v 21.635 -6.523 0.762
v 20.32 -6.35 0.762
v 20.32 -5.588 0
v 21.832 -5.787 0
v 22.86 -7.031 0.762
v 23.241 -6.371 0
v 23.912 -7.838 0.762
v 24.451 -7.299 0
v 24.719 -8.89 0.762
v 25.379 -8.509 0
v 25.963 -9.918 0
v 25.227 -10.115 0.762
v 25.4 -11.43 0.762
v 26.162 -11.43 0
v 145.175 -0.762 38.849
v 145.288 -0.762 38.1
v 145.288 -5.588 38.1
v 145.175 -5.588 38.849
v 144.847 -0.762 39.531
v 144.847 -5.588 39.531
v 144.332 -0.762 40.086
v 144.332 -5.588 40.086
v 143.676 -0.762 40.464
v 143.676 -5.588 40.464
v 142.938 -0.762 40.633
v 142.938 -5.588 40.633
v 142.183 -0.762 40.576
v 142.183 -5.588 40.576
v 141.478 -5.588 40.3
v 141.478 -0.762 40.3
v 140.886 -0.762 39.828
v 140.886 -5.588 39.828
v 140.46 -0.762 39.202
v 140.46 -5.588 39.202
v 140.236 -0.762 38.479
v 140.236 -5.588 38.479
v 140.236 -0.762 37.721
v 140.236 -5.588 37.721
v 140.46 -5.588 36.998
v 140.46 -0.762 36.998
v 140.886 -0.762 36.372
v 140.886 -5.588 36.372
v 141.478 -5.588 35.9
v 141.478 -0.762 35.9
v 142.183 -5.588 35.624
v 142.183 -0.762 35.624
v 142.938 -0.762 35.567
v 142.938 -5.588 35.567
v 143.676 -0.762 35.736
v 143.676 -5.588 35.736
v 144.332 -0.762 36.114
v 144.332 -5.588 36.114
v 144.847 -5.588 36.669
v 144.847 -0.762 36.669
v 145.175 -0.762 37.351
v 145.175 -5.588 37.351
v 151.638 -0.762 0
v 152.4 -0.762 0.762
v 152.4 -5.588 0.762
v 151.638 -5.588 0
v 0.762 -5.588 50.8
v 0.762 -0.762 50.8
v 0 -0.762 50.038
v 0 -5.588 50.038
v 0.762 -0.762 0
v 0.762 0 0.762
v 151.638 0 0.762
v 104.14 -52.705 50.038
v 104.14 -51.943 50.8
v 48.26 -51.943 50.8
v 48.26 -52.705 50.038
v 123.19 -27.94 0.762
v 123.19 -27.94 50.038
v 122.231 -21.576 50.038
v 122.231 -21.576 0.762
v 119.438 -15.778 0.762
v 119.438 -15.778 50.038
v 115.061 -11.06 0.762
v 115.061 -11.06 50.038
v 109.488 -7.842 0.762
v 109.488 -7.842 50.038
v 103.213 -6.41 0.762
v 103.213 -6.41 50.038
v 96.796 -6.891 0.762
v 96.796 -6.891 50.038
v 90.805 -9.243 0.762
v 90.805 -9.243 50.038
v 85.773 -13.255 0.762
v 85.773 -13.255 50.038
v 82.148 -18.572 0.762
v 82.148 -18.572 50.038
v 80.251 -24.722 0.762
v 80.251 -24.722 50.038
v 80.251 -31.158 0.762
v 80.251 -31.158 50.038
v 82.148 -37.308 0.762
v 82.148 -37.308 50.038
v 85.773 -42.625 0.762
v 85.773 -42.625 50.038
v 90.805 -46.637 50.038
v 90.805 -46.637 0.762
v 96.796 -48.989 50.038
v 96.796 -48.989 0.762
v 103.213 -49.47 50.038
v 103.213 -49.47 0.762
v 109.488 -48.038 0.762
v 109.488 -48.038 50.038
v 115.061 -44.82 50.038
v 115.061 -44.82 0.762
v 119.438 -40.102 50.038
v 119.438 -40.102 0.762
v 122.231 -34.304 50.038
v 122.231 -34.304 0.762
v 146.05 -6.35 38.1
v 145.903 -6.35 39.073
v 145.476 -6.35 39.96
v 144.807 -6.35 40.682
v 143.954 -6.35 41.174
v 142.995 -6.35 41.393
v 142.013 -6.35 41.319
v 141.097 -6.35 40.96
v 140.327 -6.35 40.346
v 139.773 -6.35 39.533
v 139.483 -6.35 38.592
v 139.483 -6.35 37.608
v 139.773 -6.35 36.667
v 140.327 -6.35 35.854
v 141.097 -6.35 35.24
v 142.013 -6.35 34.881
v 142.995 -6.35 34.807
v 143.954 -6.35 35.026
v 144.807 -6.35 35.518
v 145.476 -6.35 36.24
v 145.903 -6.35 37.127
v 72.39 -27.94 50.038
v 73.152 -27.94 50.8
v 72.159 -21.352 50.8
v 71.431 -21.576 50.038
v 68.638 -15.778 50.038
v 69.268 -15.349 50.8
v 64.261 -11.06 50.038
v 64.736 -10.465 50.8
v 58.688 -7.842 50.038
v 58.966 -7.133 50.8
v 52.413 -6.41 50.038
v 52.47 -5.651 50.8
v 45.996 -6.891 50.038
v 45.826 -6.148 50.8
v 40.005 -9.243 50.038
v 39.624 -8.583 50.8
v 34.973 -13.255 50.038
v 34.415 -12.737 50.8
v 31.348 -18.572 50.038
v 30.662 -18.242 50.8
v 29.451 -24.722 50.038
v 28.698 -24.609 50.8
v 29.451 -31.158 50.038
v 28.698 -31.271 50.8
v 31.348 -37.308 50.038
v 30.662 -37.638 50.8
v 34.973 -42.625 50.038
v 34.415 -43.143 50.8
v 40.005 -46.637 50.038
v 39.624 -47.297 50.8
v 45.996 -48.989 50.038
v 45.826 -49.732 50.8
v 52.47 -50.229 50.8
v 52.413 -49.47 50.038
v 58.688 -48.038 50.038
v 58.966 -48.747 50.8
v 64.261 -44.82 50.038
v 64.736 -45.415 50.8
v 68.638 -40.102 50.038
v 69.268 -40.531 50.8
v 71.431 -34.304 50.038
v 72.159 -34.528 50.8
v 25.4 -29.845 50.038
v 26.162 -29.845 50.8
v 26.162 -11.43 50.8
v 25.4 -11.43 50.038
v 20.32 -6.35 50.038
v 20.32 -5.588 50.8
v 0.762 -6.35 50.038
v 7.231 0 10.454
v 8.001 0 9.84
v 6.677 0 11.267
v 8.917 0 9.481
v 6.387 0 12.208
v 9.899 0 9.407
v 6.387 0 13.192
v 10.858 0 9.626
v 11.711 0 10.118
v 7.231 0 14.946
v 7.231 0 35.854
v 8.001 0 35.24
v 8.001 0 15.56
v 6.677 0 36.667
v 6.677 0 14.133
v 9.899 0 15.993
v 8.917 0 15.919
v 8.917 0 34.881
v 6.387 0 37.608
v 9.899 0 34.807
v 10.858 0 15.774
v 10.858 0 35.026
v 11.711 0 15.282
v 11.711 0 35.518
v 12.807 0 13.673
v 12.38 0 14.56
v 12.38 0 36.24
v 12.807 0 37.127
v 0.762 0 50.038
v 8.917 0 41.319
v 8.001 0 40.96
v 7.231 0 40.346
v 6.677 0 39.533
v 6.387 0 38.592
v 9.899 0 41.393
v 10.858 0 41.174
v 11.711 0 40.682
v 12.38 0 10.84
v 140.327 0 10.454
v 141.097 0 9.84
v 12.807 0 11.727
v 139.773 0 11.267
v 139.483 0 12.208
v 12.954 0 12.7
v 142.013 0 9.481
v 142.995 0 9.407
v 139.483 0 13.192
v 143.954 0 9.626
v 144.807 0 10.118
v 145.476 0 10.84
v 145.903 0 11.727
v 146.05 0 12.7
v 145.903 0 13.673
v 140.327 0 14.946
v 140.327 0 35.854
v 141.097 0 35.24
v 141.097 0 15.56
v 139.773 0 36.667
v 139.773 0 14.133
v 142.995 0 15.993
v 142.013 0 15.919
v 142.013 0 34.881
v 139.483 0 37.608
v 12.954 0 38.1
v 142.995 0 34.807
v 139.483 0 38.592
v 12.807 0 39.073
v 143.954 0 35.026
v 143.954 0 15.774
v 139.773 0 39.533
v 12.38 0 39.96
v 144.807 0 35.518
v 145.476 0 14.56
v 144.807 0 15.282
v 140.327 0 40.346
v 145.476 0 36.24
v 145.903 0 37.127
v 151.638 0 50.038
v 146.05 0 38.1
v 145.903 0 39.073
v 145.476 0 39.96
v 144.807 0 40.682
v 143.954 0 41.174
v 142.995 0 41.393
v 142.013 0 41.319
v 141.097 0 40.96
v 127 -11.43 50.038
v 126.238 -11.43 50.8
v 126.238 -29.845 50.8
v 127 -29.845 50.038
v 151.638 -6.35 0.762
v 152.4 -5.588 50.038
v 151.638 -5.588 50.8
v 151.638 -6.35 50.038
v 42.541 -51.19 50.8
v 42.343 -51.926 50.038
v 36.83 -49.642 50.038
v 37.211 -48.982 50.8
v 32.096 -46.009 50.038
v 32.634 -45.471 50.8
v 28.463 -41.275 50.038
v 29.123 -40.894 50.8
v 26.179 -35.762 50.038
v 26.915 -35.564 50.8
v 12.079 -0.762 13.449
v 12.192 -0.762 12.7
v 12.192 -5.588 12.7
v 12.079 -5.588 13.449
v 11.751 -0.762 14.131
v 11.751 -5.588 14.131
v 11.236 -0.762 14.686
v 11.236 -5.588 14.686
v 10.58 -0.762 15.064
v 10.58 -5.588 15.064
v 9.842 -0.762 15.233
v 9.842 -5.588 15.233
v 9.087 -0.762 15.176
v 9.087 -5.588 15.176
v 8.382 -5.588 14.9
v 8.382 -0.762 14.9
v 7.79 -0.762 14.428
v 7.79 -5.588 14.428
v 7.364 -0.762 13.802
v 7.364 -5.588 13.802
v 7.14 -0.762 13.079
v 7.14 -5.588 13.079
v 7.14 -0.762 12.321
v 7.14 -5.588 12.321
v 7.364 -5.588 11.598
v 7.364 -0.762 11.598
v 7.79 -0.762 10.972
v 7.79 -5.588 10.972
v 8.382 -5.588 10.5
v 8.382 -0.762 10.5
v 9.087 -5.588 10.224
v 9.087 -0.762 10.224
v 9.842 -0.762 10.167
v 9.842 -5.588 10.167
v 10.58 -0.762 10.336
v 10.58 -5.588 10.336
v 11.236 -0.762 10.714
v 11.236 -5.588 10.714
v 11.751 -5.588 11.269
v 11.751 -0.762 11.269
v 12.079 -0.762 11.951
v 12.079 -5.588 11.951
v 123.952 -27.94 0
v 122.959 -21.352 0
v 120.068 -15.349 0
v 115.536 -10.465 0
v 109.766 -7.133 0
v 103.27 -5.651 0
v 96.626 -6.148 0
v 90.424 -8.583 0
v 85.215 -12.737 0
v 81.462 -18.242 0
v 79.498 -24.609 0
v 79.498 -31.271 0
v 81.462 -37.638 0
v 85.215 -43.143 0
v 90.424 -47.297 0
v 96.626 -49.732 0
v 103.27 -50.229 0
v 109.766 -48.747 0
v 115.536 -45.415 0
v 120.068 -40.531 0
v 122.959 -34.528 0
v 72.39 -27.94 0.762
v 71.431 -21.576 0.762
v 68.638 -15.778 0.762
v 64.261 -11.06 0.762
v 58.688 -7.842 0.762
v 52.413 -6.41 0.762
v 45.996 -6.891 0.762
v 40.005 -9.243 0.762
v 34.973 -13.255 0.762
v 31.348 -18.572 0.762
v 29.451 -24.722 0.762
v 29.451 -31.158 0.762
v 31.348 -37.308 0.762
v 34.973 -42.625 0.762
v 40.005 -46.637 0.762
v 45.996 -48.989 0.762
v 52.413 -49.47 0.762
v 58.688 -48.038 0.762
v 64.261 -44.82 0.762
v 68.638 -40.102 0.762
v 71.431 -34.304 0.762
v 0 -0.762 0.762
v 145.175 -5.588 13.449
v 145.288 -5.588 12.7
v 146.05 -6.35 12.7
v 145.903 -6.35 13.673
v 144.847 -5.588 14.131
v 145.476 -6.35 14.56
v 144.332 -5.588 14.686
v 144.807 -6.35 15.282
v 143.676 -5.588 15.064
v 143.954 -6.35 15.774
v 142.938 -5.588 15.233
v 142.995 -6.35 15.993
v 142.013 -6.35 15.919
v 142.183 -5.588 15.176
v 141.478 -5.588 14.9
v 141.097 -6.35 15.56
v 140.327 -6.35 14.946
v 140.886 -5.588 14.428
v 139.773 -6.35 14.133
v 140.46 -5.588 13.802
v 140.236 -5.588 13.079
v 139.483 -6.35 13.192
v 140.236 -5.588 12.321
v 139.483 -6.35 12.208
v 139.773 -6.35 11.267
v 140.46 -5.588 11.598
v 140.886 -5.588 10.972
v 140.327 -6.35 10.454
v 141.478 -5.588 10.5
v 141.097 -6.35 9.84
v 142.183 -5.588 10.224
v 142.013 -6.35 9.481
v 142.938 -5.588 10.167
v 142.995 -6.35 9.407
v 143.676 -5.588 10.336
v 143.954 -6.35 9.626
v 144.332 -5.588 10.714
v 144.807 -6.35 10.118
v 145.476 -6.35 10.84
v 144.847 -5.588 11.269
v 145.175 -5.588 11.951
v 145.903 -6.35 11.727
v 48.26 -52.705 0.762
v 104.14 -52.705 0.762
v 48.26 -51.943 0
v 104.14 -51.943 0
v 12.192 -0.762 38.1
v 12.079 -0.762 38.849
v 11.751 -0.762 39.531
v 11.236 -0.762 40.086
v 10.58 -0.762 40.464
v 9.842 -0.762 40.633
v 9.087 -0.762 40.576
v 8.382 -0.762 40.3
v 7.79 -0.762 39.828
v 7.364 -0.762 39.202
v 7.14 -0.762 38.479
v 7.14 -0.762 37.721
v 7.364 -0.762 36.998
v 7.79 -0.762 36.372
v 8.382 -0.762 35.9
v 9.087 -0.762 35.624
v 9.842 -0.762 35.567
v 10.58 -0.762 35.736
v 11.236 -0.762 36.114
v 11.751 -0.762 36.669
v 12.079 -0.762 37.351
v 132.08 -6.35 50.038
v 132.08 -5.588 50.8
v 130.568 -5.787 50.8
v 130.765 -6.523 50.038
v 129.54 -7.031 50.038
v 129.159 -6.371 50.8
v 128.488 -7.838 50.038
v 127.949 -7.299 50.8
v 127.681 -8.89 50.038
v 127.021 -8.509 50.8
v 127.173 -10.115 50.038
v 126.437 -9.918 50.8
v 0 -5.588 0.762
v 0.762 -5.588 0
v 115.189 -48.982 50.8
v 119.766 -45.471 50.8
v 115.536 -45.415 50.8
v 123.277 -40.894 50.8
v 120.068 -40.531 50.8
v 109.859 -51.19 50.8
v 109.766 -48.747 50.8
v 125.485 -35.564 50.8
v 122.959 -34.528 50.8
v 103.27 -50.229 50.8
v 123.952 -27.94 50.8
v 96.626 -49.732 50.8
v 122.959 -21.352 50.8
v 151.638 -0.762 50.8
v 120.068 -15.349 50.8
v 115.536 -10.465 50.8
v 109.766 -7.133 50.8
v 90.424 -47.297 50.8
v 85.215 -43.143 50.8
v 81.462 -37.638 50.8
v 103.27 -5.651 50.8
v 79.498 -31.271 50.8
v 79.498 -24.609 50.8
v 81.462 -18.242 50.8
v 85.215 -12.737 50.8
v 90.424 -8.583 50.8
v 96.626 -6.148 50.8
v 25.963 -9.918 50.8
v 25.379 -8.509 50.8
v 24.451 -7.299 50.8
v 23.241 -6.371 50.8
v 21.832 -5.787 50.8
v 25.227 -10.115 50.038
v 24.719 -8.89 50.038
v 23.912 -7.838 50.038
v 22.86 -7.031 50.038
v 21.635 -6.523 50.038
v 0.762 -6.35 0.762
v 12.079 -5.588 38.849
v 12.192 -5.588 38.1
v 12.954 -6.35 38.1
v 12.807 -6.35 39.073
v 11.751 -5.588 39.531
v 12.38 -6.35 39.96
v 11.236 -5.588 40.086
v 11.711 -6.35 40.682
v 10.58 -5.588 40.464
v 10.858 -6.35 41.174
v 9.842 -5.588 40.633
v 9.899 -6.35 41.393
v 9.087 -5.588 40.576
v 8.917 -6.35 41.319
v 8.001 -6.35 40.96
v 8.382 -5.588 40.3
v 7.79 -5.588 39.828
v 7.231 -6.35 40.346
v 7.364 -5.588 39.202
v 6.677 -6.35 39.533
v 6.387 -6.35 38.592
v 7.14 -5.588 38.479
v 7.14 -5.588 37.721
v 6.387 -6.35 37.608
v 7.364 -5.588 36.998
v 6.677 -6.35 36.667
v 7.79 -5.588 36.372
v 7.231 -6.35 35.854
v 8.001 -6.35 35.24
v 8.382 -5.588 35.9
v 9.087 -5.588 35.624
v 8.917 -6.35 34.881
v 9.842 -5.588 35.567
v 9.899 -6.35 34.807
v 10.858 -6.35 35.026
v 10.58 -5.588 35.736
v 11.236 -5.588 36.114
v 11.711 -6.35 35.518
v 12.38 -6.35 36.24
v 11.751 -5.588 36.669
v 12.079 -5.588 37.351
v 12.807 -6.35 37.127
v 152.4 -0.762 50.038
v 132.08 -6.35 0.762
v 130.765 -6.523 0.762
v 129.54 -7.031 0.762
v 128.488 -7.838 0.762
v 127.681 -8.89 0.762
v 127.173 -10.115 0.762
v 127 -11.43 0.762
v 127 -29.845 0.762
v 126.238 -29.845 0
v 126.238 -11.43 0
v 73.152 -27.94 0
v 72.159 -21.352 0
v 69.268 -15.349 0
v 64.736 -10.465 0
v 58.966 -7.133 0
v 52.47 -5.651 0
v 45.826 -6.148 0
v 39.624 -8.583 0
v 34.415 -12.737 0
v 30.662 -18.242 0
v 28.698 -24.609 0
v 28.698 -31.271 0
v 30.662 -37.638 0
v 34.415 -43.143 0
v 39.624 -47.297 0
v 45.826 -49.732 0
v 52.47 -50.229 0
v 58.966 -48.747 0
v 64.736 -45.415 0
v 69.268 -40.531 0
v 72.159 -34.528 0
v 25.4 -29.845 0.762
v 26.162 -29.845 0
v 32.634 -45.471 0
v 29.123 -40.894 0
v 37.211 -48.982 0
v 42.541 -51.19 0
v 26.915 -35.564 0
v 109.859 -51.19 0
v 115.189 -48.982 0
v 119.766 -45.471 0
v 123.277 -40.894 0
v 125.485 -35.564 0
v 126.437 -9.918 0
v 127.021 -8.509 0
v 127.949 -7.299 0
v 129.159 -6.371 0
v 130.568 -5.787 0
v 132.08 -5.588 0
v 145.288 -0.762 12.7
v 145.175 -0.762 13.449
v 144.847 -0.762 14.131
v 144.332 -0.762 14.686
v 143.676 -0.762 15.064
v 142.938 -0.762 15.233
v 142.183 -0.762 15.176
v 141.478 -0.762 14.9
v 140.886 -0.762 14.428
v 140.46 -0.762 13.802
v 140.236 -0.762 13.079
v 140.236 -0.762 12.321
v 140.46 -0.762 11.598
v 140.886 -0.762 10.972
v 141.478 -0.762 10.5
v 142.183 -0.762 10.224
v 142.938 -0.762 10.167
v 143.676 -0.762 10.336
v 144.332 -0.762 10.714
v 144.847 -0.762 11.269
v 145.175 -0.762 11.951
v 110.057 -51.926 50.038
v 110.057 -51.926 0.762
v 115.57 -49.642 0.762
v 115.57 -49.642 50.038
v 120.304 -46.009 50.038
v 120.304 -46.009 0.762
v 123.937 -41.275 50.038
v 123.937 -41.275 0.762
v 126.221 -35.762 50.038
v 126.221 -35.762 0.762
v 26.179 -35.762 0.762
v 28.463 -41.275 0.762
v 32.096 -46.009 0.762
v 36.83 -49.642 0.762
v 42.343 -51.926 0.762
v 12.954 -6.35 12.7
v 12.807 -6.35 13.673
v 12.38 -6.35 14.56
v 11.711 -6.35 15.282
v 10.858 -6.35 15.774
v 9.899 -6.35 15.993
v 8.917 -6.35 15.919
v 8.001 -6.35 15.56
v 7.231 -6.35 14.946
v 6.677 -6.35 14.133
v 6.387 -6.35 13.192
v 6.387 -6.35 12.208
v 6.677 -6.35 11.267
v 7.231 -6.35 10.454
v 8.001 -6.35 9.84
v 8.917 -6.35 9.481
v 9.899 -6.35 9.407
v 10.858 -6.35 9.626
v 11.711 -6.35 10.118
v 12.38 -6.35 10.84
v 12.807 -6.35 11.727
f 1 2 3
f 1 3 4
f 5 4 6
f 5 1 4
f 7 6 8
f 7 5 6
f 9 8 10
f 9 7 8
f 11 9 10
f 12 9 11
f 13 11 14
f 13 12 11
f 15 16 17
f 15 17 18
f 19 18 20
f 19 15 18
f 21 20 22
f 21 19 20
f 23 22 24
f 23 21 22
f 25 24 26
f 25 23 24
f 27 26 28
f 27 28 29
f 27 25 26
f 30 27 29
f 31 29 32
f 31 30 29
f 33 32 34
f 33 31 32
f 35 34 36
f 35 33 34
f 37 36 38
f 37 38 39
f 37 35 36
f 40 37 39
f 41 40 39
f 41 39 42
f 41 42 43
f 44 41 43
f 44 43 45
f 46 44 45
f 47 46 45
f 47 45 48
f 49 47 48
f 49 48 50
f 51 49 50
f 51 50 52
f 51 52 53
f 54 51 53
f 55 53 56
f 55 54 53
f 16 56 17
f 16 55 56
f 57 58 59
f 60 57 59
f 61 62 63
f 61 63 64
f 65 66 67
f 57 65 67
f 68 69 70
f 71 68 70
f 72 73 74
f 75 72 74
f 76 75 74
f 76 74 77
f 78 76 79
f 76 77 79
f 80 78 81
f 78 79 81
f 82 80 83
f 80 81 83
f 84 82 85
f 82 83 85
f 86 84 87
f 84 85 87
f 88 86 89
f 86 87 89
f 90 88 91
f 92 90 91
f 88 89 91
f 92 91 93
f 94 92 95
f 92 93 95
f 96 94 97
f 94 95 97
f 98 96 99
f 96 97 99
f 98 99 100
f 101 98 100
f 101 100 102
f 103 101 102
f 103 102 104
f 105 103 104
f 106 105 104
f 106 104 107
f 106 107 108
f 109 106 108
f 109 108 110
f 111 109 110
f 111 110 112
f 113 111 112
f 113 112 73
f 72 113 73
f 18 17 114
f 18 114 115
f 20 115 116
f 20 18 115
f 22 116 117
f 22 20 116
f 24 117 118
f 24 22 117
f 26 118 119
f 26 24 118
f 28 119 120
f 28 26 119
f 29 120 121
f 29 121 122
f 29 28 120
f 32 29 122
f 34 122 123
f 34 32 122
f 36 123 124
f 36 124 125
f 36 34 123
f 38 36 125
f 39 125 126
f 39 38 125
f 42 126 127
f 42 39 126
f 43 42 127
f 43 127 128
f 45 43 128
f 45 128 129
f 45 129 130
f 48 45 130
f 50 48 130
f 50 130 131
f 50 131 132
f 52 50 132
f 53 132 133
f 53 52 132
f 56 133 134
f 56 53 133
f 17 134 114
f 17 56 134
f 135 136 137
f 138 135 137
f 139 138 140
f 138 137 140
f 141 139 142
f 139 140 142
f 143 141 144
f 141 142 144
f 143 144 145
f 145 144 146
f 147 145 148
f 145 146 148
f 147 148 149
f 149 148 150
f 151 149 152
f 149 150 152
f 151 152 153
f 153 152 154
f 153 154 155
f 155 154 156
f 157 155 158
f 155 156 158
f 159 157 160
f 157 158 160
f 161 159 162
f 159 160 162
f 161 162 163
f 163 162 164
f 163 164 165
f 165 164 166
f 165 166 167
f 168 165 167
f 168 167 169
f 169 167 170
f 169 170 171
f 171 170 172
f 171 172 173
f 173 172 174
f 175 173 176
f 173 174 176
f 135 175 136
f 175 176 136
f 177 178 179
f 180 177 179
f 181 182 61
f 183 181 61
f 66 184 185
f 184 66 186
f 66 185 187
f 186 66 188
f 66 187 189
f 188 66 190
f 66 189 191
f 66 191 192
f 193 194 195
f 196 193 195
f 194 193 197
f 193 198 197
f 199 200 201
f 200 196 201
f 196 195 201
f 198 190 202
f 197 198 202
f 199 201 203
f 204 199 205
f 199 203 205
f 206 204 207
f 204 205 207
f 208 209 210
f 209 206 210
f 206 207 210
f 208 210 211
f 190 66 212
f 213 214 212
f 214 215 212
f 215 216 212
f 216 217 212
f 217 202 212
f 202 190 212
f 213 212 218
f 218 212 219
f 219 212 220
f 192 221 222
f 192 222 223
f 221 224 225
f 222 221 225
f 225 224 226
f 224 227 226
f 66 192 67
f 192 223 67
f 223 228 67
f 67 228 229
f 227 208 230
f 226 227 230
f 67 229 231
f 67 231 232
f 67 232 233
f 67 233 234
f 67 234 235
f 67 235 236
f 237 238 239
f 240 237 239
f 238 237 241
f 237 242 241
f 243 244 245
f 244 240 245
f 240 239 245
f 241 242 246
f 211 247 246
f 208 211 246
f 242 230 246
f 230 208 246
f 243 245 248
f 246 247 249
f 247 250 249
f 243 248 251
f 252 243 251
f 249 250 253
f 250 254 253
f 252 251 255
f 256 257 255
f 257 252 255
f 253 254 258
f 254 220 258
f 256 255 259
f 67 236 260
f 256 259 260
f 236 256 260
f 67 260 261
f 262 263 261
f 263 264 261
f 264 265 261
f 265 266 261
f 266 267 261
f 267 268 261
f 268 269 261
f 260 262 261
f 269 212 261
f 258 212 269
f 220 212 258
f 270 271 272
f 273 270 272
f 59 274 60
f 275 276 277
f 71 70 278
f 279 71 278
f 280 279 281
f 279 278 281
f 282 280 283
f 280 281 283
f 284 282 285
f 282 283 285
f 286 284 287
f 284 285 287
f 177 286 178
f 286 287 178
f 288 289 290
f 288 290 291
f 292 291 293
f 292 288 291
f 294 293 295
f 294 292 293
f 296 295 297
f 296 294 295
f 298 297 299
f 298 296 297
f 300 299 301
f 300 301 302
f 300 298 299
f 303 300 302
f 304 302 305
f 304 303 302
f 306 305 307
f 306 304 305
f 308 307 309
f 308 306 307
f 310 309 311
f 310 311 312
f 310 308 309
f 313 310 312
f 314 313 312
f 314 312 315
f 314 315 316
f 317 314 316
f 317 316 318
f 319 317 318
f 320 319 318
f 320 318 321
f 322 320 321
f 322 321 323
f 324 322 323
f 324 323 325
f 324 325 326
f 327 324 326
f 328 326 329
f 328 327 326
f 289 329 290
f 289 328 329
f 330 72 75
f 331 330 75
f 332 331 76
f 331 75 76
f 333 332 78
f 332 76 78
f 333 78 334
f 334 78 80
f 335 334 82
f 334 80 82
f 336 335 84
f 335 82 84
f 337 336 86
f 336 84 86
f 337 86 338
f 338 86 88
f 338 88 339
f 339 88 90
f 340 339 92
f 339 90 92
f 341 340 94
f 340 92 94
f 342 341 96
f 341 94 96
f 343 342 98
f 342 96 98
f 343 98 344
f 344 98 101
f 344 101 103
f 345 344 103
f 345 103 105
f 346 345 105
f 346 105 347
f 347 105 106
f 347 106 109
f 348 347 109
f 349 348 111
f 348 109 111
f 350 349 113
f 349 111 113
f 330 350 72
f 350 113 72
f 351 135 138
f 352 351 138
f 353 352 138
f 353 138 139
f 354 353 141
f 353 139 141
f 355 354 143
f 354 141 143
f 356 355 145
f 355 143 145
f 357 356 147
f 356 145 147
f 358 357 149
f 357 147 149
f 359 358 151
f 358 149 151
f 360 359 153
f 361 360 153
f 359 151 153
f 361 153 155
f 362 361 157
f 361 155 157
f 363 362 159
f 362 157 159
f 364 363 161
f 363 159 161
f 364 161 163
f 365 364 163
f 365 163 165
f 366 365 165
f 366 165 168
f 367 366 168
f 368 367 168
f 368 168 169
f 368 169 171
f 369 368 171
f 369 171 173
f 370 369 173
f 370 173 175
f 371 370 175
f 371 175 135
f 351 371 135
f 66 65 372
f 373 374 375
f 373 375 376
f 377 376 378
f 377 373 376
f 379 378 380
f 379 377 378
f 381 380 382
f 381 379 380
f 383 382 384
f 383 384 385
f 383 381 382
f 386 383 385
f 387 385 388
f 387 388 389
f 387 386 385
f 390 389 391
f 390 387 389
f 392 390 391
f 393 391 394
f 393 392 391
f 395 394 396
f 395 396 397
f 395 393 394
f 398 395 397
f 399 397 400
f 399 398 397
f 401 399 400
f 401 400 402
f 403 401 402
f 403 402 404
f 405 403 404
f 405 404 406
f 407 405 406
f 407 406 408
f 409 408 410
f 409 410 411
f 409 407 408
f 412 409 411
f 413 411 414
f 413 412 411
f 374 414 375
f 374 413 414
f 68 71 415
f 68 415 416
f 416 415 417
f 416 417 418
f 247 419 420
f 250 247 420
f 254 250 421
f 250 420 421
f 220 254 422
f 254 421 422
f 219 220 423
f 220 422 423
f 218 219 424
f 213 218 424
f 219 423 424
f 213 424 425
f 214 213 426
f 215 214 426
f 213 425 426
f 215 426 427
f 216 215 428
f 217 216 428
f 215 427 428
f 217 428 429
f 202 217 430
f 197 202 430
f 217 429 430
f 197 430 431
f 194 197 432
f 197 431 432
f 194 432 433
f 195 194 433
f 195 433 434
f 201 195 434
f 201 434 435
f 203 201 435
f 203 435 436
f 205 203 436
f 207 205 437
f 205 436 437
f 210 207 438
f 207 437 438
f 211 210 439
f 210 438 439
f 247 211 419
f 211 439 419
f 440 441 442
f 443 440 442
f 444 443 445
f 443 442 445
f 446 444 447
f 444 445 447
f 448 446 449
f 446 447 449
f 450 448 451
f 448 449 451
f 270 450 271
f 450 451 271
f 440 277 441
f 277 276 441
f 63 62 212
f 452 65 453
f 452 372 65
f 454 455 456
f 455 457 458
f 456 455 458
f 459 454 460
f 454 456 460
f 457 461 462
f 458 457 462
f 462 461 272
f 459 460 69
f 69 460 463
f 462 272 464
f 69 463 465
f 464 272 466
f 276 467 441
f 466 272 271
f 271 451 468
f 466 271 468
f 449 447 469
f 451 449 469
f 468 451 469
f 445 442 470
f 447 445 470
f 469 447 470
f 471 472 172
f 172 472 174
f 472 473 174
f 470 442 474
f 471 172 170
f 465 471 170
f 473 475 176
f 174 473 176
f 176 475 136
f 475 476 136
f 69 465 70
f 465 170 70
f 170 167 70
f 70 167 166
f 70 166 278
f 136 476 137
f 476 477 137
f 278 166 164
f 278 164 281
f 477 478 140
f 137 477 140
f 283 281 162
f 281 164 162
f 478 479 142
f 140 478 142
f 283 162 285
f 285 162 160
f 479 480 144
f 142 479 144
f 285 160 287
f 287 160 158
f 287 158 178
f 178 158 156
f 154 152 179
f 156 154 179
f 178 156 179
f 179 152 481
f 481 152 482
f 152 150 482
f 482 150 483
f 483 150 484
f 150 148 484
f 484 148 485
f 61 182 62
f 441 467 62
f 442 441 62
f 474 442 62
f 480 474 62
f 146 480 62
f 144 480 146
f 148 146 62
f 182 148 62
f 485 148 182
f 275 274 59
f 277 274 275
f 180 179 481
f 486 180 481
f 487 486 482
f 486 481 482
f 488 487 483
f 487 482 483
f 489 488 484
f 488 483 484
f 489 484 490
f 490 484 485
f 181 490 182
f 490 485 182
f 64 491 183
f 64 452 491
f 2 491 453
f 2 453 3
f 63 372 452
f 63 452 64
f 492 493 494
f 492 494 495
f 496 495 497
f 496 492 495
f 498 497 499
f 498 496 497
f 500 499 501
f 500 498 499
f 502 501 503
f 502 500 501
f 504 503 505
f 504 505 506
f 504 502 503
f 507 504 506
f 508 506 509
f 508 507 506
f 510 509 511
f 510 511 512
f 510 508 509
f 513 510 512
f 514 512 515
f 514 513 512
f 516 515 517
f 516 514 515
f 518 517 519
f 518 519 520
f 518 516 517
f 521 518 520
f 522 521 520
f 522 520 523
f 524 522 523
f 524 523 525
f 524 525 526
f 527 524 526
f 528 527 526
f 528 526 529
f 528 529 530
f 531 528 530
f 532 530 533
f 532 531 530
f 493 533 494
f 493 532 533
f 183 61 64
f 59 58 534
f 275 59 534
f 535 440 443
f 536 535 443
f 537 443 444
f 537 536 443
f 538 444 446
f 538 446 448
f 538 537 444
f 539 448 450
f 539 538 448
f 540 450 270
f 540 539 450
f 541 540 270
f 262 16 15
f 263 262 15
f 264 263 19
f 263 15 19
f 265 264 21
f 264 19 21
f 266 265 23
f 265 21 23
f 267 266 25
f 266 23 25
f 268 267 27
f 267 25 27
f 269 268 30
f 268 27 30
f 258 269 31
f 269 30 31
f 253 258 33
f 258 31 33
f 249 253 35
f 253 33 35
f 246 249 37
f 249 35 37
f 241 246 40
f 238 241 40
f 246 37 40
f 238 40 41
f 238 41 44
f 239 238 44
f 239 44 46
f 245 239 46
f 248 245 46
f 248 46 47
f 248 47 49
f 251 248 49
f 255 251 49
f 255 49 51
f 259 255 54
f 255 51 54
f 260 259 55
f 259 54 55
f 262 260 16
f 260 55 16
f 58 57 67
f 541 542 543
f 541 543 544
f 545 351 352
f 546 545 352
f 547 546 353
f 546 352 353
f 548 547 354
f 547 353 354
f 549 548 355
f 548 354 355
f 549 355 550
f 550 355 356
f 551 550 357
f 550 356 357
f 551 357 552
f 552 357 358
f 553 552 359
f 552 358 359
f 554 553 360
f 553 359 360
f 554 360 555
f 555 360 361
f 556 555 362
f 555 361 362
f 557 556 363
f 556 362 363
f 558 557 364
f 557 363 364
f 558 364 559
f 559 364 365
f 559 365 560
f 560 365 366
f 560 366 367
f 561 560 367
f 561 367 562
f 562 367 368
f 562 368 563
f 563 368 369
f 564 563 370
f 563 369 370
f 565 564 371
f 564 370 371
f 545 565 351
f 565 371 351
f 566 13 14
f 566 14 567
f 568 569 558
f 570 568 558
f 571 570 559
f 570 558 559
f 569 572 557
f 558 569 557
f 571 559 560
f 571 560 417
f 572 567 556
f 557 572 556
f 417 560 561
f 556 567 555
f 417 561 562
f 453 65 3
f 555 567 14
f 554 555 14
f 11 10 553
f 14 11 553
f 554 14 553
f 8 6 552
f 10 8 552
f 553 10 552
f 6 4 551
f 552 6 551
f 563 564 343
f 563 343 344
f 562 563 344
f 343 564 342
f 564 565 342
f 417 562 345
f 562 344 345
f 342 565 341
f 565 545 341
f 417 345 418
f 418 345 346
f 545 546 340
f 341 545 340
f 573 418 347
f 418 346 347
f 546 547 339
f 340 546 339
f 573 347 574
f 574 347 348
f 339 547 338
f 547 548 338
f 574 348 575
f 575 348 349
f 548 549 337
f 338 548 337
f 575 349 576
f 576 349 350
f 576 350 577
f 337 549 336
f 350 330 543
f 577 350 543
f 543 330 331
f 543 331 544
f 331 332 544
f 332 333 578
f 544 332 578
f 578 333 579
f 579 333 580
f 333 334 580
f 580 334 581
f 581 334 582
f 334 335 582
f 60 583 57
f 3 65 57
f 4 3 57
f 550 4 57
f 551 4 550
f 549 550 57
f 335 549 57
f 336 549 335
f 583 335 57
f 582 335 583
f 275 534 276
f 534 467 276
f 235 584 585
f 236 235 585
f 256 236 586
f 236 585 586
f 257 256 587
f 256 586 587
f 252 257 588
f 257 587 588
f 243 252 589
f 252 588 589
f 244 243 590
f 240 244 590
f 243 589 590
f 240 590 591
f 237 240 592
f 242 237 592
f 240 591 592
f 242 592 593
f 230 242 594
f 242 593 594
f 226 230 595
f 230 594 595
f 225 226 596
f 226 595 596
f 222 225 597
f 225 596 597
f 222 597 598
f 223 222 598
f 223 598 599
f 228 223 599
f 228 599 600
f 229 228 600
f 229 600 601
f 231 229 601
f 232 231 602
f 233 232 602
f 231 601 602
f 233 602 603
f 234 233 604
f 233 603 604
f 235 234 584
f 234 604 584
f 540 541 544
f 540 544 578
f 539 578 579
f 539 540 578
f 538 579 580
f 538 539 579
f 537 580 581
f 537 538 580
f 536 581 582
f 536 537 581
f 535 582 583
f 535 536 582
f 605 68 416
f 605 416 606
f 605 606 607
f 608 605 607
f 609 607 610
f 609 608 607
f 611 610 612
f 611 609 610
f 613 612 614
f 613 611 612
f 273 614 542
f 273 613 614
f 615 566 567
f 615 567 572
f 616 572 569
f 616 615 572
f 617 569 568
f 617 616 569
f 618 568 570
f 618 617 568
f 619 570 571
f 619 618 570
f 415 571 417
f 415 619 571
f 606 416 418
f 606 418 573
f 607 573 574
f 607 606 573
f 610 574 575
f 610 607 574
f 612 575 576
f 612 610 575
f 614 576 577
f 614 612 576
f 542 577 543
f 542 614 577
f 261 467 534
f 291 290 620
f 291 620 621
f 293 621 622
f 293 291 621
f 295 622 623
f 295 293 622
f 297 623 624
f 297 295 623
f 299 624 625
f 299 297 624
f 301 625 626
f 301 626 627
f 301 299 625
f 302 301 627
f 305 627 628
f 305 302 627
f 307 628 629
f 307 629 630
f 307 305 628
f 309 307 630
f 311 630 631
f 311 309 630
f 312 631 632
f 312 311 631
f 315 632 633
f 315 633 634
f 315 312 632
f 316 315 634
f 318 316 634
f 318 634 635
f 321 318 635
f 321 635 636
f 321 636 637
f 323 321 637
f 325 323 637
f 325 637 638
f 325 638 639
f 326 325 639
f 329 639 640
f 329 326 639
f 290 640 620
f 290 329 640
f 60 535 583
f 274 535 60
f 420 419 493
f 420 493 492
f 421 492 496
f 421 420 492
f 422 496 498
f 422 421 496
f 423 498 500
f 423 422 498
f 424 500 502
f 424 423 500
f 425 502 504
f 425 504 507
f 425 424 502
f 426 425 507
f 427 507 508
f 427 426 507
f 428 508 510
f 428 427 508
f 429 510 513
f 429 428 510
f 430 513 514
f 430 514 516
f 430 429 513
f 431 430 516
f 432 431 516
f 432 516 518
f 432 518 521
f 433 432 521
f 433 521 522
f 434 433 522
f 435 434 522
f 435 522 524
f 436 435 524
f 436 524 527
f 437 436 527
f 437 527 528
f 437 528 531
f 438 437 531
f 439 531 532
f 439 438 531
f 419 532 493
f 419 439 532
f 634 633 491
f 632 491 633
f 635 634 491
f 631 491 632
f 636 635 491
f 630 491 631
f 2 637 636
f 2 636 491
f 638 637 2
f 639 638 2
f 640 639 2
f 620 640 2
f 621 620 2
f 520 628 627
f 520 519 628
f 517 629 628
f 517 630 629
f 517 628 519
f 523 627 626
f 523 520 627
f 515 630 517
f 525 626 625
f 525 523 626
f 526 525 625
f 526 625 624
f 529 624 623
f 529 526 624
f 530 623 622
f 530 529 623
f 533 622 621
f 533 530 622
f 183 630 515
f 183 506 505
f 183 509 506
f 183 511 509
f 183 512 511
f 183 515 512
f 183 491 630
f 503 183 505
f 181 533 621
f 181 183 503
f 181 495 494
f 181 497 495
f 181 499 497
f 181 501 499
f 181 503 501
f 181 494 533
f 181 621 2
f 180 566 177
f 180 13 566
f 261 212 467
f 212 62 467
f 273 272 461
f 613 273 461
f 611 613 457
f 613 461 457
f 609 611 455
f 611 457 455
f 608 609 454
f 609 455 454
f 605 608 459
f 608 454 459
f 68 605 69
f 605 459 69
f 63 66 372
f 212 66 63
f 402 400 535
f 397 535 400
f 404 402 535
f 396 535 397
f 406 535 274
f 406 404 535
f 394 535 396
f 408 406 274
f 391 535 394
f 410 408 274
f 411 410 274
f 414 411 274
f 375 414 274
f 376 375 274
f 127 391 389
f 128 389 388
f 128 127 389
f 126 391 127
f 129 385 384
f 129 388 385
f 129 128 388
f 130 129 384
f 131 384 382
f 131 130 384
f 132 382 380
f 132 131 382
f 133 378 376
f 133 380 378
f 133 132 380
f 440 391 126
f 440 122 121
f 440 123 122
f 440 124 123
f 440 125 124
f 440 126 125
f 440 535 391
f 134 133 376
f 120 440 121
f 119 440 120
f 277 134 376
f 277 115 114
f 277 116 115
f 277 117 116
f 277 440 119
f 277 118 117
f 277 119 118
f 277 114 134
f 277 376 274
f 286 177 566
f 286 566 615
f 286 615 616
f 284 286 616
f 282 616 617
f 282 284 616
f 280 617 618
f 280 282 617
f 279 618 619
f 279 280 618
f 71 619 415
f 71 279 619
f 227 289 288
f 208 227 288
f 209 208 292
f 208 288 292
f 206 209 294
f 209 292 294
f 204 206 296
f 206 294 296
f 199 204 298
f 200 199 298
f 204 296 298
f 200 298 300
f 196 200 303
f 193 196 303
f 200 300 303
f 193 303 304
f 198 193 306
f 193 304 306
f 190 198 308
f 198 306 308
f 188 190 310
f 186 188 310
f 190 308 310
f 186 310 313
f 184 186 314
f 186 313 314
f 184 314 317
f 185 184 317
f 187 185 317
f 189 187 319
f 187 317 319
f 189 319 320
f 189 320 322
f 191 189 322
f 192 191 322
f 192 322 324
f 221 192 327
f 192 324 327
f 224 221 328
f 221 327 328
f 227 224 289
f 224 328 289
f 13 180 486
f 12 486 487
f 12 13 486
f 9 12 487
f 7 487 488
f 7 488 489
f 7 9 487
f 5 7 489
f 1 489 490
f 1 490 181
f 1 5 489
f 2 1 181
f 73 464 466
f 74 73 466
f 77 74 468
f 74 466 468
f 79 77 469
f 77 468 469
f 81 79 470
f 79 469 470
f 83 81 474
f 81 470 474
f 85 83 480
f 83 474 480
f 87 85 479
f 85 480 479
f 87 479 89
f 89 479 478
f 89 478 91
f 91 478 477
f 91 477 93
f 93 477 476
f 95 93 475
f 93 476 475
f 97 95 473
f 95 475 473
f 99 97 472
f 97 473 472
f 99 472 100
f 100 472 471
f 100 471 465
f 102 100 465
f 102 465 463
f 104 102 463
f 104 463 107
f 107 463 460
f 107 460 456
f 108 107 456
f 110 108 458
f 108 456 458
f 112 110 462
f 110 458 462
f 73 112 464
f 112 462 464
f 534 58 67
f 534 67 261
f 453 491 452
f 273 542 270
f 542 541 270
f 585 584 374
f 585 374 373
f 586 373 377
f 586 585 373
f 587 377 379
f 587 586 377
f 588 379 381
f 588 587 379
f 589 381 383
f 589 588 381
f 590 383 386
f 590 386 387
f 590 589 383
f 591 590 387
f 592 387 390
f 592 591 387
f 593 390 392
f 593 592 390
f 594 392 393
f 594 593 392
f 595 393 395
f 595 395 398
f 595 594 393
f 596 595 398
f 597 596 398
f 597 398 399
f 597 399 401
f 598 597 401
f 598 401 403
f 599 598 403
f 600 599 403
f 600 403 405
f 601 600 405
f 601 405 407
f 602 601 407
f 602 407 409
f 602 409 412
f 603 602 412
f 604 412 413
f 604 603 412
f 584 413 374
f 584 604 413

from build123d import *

# Parameters (mm, degrees)
F0_W     = 25.4
F0_H     = 50.8
F0_R     = 2.54
F0_W_2   = 50.8
F1_DEPTH = 6.35
F2_DEPTH = 52.705
F3_R     = 5.08
F4_R     = 21.59
F5_DEPTH = 50.801
F6_R     = 22.86
F7_SIZE  = 0.762


with BuildPart() as f1:
    # F0 (on Front) → F1 (new body)
    with BuildSketch(Plane.XZ):
        with Locations((12.7, 25.4)):
            Rectangle(F0_W, F0_H)
        with Locations((9.652, 12.7)):
            Circle(F0_R, mode=Mode.SUBTRACT)
        with Locations((9.652, 38.1)):
            Circle(F0_R, mode=Mode.SUBTRACT)
        with Locations((139.7, 25.4)):
            Rectangle(F0_W, F0_H)
        with Locations((142.748, 12.7)):
            Circle(F0_R, mode=Mode.SUBTRACT)
        with Locations((142.748, 38.1)):
            Circle(F0_R, mode=Mode.SUBTRACT)
        with Locations((50.8, 25.4)):
            Rectangle(F0_W_2, F0_H)
        with Locations((101.6, 25.4)):
            Rectangle(F0_W_2, F0_H)
    extrude(amount=F1_DEPTH)

    # F0 (on Front) → F2 (join)
    with BuildSketch(Plane.XZ):
        with Locations((50.8, 25.4)):
            Rectangle(F0_W_2, F0_H)
        with Locations((101.6, 25.4)):
            Rectangle(F0_W_2, F0_H)
    extrude(amount=F2_DEPTH)

    # F3
    f3_edges = [f1.edges().sort_by_distance(p)[0] for p in [
        (127, -6.35, 25.4),
        (25.4, -6.35, 25.4),
    ]]
    fillet(f3_edges, radius=F3_R)

    # F4 (on face) → F5 (cut, through all)
    with BuildSketch(Plane.XY.offset(50.8)):
        with Locations((50.8, -27.94)):
            Circle(F4_R)
        with Locations((101.6, -27.94)):
            Circle(F4_R)
    extrude(amount=-F5_DEPTH, mode=Mode.SUBTRACT)

    # F6
    f6_edges = [f1.edges().sort_by_distance(p)[0] for p in [
        (127, -52.705, 25.4),
        (25.4, -52.705, 25.4),
    ]]
    fillet(f6_edges, radius=F6_R)

    # F7
    f7_edges = [f1.edges().sort_by_distance(p)[0] for p in [
        (127, -20.6375, 50.8),
        (120.304461, -46.009461, 50.8),
        (128.487898, -7.837898, 50.8),
        (76.2, -52.705, 50.8),
        (142.24, -6.35, 50.8),
        (32.095539, -46.009461, 50.8),
        (152.4, -3.175, 50.8),
        (25.4, -20.6375, 50.8),
        (76.2, 0, 50.8),
        (23.912102, -7.837898, 50.8),
        (0, -3.175, 50.8),
        (10.16, -6.35, 50.8),
        (80.01, -27.94, 50.8),
        (29.21, -27.94, 50.8),
        (20.32, -6.35, 25.4),
        (0, -6.35, 25.4),
        (10.16, -6.35, 0),
        (7.112, -6.35, 12.7),
        (7.112, -6.35, 38.1),
        (132.08, -6.35, 25.4),
        (152.4, -6.35, 25.4),
        (142.24, -6.35, 0),
        (140.208, -6.35, 12.7),
        (140.208, -6.35, 38.1),
        (25.4, -20.6375, 0),
        (32.095539, -46.009461, 0),
        (23.912102, -7.837898, 0),
        (76.2, -52.705, 0),
        (120.304461, -46.009461, 0),
        (0, -3.175, 0),
        (127, -20.6375, 0),
        (76.2, 0, 0),
        (128.487898, -7.837898, 0),
        (152.4, -3.175, 0),
        (29.21, -27.94, 0),
        (80.01, -27.94, 0),
        (0, 0, 25.4),
        (152.4, 0, 25.4),
        (7.112, 0, 12.7),
        (7.112, 0, 38.1),
        (140.208, 0, 38.1),
        (140.208, 0, 12.7),
    ]]
    chamfer(f7_edges, length=F7_SIZE)


solid = f1.part
